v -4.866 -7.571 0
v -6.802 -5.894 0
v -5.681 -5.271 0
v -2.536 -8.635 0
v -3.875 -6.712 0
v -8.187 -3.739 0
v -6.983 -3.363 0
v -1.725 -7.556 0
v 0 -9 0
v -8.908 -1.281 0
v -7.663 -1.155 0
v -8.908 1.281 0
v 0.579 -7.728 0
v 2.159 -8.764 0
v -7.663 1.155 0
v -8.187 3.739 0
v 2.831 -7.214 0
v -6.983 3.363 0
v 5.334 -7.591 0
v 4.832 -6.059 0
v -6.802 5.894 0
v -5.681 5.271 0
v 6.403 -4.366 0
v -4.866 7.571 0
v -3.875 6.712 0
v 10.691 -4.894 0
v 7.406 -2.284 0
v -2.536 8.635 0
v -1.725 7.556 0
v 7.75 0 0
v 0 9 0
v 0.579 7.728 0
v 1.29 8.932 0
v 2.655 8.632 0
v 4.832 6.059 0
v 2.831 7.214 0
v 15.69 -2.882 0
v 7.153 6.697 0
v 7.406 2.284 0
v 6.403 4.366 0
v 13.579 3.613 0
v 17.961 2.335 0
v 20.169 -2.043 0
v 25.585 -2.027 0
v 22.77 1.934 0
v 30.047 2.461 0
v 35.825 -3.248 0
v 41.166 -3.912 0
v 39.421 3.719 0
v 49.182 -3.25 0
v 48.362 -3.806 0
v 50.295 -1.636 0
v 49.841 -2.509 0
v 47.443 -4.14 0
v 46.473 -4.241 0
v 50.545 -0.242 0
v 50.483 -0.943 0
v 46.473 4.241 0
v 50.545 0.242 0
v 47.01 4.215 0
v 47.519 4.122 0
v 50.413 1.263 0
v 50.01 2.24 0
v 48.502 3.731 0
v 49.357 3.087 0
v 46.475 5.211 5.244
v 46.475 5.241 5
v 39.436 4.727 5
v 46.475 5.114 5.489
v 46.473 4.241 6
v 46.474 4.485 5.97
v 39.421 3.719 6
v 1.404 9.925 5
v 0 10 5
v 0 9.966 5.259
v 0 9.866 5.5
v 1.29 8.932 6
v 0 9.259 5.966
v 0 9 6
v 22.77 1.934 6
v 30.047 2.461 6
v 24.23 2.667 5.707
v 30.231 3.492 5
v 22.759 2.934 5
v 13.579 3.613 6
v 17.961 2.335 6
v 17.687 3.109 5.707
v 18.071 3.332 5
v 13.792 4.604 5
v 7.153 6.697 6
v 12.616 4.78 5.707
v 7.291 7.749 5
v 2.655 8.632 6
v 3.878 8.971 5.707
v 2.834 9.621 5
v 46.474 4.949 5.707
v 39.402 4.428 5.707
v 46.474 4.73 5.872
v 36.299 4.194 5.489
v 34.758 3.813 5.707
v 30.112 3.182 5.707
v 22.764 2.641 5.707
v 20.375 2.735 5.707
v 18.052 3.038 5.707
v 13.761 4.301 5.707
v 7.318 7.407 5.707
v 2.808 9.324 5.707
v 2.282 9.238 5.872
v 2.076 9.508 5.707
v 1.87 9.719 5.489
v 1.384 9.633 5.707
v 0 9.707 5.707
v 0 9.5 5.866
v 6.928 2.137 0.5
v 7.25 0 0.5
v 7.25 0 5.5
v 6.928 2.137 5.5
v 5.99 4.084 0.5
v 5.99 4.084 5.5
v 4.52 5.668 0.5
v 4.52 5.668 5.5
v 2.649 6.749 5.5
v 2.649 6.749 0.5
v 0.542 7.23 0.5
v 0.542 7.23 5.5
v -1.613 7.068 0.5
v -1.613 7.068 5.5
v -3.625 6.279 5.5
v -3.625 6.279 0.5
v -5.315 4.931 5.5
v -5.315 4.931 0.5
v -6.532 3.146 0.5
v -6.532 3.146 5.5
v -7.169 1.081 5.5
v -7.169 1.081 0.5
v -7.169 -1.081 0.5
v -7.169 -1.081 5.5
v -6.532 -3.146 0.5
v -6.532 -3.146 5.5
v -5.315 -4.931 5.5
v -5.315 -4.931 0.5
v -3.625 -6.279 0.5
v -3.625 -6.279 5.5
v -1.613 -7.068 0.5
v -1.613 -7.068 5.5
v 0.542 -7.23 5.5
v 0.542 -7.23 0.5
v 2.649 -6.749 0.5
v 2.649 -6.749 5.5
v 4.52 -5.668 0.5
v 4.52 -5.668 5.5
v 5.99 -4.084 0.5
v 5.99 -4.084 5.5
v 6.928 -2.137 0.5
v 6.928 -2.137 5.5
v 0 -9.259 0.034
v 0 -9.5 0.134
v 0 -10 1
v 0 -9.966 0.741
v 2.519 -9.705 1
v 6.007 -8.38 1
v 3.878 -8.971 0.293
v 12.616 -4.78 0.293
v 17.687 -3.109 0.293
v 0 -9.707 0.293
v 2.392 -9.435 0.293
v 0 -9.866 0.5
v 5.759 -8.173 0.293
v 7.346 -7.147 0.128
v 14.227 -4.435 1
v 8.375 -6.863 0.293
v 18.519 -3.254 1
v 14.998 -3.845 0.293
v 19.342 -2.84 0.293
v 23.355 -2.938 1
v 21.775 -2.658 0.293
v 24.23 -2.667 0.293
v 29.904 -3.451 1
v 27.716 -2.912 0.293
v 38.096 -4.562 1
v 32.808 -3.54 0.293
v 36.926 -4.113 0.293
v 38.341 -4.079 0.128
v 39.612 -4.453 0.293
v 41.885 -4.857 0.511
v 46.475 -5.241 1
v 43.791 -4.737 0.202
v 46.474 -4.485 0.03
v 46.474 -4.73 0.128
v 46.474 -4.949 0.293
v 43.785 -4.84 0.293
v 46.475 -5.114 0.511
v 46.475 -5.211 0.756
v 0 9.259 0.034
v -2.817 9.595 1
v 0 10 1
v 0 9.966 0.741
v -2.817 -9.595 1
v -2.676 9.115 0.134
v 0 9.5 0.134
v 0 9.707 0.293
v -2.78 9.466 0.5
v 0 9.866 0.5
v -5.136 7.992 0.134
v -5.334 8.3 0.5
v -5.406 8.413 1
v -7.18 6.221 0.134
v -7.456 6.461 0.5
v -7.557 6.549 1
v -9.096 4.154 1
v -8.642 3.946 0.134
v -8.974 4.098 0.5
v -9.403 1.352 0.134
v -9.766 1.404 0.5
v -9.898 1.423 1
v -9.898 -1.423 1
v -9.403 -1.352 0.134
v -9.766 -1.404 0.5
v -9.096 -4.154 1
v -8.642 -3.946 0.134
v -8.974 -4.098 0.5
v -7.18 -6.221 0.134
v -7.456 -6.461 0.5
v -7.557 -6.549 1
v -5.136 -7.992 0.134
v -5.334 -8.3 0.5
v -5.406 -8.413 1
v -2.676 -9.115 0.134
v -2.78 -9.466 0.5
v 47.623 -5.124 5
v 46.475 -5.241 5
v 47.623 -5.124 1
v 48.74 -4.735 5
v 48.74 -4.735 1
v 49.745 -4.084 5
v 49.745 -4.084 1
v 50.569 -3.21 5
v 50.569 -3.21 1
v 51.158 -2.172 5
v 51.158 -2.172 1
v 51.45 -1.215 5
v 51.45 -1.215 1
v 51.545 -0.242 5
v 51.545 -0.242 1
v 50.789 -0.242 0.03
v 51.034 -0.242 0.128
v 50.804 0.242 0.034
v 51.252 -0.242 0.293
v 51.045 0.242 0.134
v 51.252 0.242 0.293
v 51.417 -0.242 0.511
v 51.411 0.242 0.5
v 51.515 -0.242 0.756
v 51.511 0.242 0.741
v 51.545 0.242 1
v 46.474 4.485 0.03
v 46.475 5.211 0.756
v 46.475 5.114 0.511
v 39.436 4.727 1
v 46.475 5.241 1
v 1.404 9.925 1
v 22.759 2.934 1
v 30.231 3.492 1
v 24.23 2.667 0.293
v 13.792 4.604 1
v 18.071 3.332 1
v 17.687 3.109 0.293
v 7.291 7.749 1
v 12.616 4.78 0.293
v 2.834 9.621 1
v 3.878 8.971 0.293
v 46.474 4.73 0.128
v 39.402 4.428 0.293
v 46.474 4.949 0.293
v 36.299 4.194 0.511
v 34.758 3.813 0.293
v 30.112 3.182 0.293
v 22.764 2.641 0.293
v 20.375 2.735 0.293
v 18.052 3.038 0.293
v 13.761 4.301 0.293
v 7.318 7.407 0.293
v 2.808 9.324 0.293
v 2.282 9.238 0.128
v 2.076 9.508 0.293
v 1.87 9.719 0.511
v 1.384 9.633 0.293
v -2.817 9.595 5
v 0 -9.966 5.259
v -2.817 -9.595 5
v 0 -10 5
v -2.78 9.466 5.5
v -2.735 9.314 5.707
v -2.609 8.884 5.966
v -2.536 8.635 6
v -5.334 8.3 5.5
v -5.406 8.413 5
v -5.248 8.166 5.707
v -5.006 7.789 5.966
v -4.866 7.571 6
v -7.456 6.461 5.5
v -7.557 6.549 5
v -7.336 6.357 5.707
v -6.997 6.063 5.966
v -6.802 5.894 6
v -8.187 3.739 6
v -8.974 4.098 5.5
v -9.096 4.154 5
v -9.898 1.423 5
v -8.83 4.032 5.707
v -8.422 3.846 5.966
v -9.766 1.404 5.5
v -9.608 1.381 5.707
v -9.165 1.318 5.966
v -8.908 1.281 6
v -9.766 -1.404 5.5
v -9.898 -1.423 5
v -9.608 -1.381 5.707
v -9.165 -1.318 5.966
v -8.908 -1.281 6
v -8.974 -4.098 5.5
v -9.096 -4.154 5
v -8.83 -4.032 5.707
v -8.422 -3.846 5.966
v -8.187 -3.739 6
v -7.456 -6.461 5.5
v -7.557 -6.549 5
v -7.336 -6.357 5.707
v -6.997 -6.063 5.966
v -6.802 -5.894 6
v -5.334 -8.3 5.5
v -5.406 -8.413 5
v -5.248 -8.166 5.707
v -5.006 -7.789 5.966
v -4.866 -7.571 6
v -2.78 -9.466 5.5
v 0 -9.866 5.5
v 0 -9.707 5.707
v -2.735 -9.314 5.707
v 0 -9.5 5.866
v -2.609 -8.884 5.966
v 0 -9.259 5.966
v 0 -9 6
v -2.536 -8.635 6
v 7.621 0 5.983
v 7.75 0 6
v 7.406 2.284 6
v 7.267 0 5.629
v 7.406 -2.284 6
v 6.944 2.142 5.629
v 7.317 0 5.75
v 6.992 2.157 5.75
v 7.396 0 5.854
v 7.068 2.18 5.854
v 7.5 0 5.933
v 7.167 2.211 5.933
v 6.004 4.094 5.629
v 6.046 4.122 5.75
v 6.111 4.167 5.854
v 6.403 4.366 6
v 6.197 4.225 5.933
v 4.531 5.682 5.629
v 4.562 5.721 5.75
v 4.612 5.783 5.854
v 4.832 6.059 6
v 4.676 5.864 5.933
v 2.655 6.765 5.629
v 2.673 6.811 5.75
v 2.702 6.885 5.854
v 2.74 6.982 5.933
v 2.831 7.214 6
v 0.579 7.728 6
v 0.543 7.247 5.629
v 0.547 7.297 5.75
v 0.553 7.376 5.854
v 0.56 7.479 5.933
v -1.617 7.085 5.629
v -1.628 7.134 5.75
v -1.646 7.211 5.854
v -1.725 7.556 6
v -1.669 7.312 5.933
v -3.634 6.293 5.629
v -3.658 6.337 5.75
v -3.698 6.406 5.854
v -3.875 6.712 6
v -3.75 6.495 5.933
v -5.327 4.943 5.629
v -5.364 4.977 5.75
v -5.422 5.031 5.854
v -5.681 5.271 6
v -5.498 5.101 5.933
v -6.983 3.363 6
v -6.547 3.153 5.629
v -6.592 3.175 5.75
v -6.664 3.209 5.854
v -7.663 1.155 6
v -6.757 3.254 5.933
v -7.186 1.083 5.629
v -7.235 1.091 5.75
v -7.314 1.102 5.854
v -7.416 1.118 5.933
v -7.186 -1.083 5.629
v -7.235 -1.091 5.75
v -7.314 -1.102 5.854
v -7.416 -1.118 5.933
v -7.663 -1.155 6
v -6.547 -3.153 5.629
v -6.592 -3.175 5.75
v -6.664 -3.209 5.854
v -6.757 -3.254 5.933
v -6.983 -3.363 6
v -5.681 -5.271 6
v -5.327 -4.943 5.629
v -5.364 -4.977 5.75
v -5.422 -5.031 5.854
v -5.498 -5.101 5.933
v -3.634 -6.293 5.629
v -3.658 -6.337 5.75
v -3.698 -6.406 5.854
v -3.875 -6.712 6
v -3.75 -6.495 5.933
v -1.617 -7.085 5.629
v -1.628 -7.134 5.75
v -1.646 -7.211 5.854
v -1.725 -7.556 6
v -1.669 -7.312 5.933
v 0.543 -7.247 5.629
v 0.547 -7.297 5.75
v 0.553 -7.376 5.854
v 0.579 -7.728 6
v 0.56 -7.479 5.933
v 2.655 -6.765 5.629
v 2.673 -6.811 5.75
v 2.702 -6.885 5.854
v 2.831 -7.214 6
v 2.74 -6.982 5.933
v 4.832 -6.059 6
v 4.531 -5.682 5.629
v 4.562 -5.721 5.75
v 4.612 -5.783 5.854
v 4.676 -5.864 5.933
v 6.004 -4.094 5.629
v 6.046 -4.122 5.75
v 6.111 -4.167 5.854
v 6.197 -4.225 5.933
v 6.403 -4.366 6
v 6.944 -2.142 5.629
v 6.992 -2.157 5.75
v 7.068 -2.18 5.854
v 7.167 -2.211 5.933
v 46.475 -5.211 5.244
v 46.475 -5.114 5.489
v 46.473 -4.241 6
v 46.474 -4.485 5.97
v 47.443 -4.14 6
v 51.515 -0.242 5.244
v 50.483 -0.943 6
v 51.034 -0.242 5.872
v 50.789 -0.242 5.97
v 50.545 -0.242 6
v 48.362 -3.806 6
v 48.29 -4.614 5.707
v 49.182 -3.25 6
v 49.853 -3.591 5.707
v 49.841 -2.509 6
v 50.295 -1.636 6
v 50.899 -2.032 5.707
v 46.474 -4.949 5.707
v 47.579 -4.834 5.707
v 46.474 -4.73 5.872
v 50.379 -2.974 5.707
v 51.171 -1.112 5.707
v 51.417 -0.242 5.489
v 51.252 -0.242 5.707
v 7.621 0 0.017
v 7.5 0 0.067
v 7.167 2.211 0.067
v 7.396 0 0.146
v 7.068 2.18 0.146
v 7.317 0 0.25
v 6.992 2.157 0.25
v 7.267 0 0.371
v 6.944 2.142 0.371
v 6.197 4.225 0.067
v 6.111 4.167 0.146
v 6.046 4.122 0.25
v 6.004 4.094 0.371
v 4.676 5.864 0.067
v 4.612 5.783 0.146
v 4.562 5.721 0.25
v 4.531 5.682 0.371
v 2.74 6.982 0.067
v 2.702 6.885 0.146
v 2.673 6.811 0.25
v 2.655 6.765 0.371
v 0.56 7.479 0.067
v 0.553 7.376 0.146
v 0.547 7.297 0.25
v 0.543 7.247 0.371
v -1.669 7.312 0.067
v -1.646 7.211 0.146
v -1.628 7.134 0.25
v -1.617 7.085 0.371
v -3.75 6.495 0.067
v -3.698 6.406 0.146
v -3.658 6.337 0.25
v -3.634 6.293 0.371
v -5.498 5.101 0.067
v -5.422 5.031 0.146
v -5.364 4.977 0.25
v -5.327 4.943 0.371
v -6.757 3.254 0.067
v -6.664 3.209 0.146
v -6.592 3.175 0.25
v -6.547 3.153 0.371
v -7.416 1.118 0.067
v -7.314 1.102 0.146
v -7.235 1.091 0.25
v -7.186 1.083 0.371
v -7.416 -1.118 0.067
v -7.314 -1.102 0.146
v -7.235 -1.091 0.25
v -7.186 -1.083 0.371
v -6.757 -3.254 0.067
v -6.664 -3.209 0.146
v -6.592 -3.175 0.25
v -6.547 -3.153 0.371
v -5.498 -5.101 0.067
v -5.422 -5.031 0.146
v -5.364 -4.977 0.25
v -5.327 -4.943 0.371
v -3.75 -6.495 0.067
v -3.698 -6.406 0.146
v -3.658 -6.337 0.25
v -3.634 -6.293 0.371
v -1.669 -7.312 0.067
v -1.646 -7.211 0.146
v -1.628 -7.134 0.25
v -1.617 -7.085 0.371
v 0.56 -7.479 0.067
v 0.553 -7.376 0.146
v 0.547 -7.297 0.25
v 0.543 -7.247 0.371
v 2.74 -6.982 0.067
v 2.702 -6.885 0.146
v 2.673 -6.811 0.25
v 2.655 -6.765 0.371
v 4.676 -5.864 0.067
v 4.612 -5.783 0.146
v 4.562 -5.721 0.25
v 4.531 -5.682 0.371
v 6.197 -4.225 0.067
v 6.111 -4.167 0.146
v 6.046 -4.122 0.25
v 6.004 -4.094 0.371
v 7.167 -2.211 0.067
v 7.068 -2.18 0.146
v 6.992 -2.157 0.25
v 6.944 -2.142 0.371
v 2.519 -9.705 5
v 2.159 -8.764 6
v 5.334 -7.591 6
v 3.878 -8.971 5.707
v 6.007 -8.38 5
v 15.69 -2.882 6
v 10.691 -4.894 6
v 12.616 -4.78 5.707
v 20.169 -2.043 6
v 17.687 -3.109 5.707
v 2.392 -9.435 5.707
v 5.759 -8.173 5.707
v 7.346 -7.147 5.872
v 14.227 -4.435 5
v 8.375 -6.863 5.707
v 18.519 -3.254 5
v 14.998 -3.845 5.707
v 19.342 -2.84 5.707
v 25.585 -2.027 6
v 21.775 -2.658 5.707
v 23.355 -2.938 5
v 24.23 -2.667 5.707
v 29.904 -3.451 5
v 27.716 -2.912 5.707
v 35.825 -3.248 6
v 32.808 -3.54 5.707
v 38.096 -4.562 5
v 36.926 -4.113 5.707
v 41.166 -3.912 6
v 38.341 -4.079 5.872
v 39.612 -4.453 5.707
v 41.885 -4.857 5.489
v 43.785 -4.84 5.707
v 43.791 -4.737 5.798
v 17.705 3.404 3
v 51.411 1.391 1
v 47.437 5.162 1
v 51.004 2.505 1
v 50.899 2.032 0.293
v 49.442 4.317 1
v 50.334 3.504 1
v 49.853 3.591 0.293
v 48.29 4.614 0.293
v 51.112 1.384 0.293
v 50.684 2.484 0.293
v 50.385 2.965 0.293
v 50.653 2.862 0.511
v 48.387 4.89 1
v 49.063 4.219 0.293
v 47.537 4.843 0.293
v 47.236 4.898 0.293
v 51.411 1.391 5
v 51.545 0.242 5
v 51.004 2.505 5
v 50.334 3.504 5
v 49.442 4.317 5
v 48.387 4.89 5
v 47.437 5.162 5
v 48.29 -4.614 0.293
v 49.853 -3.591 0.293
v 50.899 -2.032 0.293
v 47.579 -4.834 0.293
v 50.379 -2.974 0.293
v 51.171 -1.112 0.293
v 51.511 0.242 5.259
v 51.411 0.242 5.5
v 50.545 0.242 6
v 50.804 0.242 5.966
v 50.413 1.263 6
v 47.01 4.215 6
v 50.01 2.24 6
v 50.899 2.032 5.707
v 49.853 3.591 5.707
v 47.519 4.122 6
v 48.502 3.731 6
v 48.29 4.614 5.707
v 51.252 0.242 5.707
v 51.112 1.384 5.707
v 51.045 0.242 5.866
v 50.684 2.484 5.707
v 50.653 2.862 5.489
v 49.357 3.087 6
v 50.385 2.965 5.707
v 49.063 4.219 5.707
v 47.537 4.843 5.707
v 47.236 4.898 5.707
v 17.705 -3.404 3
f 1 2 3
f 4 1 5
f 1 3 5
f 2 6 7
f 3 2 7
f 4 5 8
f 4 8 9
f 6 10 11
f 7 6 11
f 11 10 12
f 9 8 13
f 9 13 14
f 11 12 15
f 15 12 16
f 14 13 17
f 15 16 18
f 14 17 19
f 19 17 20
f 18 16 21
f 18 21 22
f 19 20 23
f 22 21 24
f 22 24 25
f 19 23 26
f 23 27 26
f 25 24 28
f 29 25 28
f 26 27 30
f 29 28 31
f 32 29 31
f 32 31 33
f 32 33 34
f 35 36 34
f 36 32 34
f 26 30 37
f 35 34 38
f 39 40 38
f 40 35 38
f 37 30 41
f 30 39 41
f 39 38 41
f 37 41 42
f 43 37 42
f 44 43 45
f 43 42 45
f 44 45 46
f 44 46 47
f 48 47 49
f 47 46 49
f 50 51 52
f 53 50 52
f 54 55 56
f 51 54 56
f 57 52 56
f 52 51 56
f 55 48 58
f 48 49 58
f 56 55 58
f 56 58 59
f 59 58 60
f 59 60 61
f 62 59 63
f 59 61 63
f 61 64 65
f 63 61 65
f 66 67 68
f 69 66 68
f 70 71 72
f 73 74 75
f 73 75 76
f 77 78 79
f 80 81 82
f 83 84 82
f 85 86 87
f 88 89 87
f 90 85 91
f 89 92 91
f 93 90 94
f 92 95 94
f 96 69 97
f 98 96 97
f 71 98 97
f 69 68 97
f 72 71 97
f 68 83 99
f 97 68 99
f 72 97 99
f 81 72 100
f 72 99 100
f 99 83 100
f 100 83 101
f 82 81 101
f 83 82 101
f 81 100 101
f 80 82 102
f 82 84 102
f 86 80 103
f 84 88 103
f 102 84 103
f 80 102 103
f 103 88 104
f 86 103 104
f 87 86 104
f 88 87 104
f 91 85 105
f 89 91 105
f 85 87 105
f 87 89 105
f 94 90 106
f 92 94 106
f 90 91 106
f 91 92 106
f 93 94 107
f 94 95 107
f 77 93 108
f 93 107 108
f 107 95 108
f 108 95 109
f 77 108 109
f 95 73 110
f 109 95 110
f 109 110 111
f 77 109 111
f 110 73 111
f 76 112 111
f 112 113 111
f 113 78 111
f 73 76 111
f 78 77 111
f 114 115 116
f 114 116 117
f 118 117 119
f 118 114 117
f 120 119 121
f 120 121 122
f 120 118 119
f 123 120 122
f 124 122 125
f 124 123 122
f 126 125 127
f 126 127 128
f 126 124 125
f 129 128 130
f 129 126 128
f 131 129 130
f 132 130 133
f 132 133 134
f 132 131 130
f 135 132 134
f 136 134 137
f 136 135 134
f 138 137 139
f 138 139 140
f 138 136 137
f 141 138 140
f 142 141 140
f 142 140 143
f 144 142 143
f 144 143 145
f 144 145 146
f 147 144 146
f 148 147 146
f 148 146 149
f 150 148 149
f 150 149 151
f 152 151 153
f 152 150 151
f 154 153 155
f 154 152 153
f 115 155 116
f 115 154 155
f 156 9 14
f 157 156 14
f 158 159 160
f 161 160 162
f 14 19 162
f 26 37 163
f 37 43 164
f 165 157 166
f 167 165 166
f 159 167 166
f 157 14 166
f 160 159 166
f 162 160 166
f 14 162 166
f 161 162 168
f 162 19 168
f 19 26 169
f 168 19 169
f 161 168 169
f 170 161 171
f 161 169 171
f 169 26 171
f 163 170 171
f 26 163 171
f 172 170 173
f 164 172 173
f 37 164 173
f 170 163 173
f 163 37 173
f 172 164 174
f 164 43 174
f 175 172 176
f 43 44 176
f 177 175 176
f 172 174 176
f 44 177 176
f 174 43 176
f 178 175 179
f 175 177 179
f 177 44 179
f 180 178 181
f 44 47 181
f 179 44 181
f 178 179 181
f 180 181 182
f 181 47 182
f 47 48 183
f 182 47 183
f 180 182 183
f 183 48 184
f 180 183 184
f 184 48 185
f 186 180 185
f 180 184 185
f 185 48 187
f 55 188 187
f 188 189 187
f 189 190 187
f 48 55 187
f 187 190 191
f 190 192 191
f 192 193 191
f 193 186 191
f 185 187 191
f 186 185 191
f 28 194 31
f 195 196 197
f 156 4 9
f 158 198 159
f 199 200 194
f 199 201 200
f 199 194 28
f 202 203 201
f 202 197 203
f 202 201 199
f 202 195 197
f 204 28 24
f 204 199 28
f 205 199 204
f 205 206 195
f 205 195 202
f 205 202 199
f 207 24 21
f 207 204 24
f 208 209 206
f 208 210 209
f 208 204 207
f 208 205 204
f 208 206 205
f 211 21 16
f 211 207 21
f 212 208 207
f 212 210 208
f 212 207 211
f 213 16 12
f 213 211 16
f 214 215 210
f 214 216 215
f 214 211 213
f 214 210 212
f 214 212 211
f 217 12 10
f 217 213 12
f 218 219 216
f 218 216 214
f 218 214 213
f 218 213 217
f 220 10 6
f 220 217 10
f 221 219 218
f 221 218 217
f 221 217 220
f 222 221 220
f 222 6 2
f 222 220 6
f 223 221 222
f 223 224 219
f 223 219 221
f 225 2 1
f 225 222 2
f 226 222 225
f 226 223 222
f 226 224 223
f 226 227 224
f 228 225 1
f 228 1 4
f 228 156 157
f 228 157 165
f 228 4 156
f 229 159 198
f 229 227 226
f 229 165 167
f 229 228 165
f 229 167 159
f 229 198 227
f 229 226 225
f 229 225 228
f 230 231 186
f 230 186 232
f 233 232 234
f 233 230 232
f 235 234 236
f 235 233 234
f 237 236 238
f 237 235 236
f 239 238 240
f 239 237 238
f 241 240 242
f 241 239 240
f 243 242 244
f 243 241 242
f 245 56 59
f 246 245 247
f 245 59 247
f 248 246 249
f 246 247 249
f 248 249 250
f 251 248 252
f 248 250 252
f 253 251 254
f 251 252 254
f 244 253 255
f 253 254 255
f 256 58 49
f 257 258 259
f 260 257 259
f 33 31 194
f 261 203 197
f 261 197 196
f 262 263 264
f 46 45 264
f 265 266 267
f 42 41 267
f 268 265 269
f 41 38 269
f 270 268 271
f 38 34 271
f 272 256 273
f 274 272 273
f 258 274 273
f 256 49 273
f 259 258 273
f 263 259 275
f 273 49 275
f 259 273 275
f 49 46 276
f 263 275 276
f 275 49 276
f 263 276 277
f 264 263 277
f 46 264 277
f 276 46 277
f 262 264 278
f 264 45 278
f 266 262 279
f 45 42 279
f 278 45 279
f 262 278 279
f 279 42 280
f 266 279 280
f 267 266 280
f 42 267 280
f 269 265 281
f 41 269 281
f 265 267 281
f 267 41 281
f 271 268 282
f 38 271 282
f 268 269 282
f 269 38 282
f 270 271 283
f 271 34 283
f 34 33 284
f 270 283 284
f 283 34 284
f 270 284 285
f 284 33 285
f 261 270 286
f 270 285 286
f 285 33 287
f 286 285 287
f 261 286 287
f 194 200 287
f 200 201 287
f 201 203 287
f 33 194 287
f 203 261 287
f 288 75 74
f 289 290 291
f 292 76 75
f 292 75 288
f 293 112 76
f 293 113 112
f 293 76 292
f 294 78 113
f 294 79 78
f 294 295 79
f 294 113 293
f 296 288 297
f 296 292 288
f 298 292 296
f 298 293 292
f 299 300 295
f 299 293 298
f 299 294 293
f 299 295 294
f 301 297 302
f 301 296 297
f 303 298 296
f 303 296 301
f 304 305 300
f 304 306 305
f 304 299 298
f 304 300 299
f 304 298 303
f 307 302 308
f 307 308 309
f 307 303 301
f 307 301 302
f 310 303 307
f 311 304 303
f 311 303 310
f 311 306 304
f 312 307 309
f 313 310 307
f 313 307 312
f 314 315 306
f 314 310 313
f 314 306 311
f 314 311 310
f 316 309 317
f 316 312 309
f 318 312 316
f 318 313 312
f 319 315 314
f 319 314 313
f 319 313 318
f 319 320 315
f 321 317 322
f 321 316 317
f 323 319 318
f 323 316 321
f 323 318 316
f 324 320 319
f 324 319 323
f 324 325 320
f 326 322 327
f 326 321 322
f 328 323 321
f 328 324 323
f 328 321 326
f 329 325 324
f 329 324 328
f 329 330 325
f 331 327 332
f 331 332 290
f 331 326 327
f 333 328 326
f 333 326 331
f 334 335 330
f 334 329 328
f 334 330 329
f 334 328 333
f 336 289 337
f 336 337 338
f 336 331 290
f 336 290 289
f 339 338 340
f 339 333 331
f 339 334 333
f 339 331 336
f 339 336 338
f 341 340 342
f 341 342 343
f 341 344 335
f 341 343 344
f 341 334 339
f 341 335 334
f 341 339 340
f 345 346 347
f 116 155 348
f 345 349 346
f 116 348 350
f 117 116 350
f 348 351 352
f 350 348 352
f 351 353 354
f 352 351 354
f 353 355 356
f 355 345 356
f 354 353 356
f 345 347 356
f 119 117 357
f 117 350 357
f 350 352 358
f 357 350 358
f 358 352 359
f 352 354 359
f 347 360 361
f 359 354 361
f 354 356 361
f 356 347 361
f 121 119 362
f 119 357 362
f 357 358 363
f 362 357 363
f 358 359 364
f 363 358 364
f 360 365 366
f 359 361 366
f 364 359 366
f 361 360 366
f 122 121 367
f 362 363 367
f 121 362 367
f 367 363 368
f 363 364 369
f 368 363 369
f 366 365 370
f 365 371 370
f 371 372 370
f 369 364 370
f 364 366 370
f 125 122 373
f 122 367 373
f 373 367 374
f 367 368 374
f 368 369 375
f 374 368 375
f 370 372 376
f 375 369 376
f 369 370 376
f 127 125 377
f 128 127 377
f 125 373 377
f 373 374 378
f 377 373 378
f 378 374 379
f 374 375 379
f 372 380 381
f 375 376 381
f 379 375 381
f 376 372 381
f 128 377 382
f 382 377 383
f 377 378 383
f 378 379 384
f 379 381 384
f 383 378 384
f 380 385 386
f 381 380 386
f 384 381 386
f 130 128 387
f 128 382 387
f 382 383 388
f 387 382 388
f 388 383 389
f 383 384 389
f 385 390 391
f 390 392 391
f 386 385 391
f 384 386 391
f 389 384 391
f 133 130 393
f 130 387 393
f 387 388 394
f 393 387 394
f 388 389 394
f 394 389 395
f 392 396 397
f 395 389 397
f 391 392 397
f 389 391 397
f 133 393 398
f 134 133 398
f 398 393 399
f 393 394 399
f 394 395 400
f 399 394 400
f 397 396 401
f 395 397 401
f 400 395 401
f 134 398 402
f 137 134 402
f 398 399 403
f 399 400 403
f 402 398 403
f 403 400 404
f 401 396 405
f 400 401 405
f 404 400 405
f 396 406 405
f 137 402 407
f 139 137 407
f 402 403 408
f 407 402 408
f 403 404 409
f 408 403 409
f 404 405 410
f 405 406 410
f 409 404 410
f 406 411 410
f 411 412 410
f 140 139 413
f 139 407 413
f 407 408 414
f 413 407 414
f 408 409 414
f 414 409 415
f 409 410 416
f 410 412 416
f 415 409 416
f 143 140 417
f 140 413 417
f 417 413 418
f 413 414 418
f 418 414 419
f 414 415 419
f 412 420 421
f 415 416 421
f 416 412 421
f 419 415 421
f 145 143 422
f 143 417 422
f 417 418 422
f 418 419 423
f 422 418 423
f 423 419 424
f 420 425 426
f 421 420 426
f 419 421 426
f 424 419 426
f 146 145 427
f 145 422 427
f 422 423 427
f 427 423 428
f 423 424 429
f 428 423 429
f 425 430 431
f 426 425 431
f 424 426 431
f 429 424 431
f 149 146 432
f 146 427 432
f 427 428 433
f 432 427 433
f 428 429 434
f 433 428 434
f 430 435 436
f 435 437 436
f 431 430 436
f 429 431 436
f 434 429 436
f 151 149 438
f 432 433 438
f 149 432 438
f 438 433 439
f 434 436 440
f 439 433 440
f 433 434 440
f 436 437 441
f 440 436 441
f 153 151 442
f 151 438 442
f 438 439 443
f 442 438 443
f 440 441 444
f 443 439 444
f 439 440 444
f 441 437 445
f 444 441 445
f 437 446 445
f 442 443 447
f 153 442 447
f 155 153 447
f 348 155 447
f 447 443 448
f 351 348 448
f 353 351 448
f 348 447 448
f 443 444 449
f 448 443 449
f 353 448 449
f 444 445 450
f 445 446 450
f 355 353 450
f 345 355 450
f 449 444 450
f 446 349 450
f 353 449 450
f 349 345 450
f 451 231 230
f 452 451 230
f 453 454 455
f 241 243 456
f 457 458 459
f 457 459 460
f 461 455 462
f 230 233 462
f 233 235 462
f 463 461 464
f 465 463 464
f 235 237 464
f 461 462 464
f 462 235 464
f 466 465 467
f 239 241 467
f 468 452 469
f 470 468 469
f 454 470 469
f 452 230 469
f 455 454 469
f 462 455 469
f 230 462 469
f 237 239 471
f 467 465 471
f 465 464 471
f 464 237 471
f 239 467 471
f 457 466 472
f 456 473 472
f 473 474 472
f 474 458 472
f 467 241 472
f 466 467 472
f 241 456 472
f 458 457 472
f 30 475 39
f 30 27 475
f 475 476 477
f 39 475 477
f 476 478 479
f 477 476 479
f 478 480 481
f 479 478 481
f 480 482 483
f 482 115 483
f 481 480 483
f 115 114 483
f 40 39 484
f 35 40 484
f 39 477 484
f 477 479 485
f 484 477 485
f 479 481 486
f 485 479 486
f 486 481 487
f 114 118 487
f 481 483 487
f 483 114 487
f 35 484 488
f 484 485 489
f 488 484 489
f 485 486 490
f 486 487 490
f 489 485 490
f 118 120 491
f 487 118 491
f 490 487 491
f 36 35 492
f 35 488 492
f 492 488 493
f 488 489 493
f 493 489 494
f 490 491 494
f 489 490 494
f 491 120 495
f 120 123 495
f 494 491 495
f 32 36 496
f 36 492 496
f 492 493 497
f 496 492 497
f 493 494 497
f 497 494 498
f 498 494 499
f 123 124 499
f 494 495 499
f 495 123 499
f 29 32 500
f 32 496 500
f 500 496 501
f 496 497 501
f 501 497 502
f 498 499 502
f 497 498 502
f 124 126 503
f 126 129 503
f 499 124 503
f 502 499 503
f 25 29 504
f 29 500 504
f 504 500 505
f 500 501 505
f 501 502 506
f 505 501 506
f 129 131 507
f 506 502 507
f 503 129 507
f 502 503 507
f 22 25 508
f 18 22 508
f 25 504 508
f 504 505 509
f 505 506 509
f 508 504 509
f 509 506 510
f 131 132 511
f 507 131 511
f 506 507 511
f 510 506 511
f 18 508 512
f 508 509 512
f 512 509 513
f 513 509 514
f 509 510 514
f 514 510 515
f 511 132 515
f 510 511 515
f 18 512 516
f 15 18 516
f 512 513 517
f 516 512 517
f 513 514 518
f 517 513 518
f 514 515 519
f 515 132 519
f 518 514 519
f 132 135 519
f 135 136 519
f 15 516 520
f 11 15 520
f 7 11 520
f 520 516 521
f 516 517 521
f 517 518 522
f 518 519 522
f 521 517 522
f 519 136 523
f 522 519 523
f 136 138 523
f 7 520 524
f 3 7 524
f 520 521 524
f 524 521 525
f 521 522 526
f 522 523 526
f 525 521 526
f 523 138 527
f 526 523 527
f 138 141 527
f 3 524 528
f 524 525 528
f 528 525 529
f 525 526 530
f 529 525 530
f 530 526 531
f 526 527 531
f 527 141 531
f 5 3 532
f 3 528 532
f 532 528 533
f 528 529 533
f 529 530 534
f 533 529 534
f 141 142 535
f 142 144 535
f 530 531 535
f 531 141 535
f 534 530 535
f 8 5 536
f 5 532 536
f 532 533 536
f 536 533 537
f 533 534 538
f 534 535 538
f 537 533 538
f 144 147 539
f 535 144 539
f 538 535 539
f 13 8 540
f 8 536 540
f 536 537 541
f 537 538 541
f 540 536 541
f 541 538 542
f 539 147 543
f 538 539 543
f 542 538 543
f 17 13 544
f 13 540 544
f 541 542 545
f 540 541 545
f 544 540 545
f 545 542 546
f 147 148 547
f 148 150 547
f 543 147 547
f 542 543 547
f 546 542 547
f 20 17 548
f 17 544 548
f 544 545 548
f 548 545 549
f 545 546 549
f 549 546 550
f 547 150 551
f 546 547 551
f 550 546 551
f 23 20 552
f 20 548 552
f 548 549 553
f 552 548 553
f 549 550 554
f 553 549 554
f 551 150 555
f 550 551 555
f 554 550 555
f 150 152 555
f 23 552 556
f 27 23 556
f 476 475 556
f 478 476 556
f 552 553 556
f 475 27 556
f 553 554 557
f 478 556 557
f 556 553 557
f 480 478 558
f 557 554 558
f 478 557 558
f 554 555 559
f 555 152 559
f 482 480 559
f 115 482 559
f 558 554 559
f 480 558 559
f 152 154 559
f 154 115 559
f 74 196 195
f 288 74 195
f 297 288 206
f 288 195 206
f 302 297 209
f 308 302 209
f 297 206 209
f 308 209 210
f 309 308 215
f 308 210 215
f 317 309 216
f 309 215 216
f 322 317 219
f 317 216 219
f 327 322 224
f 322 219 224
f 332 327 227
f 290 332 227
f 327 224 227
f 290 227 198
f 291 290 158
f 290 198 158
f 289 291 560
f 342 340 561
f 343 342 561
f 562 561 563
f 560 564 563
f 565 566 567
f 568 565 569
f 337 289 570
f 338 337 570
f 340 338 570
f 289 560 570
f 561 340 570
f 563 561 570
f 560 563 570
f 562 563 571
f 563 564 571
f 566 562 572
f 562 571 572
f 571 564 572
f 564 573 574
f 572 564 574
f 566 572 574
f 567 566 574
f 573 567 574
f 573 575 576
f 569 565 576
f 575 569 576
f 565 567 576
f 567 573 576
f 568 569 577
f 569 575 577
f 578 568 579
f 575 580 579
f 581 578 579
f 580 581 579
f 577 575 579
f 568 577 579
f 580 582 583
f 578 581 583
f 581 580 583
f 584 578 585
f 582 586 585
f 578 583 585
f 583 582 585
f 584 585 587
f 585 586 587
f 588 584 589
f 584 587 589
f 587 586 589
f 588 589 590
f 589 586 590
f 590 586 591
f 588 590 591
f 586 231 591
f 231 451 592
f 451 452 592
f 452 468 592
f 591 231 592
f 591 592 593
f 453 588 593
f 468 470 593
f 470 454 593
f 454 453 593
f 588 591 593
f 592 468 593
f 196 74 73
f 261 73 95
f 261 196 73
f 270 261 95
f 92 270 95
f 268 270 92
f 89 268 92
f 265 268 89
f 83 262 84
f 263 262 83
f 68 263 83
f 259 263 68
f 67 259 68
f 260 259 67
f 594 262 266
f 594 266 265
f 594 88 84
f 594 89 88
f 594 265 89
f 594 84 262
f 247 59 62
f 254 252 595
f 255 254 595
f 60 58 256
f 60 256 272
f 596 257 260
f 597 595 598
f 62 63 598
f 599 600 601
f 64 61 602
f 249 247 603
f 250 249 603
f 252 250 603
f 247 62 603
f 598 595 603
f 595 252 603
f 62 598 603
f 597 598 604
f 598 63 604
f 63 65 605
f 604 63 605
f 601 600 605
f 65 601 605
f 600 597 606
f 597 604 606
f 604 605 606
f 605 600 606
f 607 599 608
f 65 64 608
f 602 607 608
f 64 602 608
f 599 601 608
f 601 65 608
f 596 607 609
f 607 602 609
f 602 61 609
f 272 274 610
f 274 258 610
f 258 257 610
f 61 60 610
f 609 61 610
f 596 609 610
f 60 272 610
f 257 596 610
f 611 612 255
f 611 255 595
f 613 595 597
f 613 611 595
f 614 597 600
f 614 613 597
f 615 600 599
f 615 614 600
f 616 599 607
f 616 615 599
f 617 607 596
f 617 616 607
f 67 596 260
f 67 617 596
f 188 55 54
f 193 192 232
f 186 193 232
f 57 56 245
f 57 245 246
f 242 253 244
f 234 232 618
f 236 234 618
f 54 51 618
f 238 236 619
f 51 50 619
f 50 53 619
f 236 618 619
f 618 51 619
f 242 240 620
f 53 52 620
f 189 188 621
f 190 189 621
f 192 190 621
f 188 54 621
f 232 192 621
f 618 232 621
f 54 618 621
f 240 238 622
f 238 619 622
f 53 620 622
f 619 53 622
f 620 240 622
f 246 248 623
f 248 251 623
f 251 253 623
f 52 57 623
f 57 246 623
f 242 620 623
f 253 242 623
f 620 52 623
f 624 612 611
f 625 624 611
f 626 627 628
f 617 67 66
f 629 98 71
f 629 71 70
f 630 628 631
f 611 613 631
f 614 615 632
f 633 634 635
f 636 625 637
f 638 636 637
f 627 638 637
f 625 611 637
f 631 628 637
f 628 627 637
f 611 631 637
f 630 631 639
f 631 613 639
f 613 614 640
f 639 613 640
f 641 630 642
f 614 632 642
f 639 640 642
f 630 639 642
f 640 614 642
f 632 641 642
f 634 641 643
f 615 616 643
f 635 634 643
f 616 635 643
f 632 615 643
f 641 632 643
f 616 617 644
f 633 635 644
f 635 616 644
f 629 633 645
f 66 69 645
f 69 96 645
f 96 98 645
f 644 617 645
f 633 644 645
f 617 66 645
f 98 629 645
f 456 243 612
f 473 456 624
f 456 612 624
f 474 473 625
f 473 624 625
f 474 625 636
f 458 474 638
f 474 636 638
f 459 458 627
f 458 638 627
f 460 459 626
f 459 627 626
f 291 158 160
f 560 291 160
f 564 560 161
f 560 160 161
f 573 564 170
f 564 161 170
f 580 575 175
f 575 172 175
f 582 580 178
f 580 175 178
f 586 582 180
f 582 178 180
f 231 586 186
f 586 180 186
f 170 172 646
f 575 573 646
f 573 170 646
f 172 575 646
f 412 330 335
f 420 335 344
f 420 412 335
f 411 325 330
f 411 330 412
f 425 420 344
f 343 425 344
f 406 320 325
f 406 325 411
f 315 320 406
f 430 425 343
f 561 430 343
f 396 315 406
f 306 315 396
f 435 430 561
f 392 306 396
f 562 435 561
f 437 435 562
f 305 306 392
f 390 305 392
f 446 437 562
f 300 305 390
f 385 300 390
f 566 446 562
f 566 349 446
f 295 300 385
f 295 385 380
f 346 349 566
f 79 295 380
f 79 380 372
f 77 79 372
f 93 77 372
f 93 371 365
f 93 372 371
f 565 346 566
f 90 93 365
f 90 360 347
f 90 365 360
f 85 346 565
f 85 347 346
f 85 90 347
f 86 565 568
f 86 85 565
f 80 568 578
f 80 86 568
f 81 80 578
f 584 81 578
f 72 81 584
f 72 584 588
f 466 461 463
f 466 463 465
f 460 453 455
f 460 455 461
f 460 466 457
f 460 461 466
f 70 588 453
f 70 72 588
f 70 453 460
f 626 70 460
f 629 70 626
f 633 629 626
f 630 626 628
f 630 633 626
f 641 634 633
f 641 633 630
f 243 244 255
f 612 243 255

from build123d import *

# Parameters (mm, degrees)
F0_R     = 7.25
F1_DEPTH = 6
F2_R     = 5
F3_R     = 1
F4_R     = 0.5
F5_R     = 0.5


# Not quite as in the source:
# - a feature names something its author has since deleted; it is built from what else it names


with BuildPart() as f1:
    # F0 (on Top) → F1 (new body)
    with BuildSketch(Plane.XY):
        with BuildLine():
            ThreePointArc((0, -10), (7.0710678119, -7.0710678119), (10, 0))
            ThreePointArc((10, 0), (7.0710678119, 7.0710678119), (0, 10))
            ThreePointArc((0, 10), (-10, 0), (0, -10))
        make_face()
        Circle(F0_R, mode=Mode.SUBTRACT)
        with BuildLine():
            ThreePointArc((0, 10), (7.0710678119, 7.0710678119), (10, 0))
            ThreePointArc((10, 0), (7.0710678119, -7.0710678119), (0, -10))
            add(Edge.make_bspline(
                [(0, -10), (5.1704310233, -10.1955717475), (17.8057120766, 2.2538375417), (39.9110362514, -6.3769862775), (51.5451952815, -5)],
                knots=[0, 0, 0, 0, 0.4275250723, 1, 1, 1, 1], degree=3))
            Line((51.5451952815, -5), (51.5451952815, 5))
            add(Edge.make_bspline(
                [(0, 10), (5.1704310233, 10.1955717475), (17.8057120766, -2.2538375417), (39.9110362514, 6.3769862775), (51.5451952815, 5)],
                knots=[0, 0, 0, 0, 0.4275250723, 1, 1, 1, 1], degree=3))
        make_face()
    extrude(amount=F1_DEPTH)

    # F2
    f2_edges = [f1.edges().sort_by_distance(p)[0] for p in [
        (51.545195, -5, 3),
        (51.545195, 5, 3),
    ]]
    fillet(f2_edges, radius=F2_R)

    # F3
    f3_edges = [f1.edges().sort_by_distance(p)[0] for p in [
        (-10, 0, 6),
        (-10, 0, 0),
        (19.299517, -3.140676, 0),
        (19.299517, -3.140676, 6),
        (50.055771, -3.802235, 0),
        (51.545195, 0, 0),
        (19.299517, 3.140676, 0),
        (50.055771, 3.802235, 0),
        (50.055771, -3.802235, 6),
        (51.545195, 0, 6),
        (19.299517, 3.140676, 6),
        (50.055771, 3.802235, 6),
    ]]
    fillet(f3_edges, radius=F3_R)

    # F4
    f4_edges = [f1.edges().sort_by_distance(p)[0] for p in [
        (-7.25, 0, 0),
    ]]
    fillet(f4_edges, radius=F4_R)

    # F5
    f5_edges = [f1.edges().sort_by_distance(p)[0] for p in [
        (-7.25, 0, 6),
    ]]
    fillet(f5_edges, radius=F5_R)


solid = f1.part
